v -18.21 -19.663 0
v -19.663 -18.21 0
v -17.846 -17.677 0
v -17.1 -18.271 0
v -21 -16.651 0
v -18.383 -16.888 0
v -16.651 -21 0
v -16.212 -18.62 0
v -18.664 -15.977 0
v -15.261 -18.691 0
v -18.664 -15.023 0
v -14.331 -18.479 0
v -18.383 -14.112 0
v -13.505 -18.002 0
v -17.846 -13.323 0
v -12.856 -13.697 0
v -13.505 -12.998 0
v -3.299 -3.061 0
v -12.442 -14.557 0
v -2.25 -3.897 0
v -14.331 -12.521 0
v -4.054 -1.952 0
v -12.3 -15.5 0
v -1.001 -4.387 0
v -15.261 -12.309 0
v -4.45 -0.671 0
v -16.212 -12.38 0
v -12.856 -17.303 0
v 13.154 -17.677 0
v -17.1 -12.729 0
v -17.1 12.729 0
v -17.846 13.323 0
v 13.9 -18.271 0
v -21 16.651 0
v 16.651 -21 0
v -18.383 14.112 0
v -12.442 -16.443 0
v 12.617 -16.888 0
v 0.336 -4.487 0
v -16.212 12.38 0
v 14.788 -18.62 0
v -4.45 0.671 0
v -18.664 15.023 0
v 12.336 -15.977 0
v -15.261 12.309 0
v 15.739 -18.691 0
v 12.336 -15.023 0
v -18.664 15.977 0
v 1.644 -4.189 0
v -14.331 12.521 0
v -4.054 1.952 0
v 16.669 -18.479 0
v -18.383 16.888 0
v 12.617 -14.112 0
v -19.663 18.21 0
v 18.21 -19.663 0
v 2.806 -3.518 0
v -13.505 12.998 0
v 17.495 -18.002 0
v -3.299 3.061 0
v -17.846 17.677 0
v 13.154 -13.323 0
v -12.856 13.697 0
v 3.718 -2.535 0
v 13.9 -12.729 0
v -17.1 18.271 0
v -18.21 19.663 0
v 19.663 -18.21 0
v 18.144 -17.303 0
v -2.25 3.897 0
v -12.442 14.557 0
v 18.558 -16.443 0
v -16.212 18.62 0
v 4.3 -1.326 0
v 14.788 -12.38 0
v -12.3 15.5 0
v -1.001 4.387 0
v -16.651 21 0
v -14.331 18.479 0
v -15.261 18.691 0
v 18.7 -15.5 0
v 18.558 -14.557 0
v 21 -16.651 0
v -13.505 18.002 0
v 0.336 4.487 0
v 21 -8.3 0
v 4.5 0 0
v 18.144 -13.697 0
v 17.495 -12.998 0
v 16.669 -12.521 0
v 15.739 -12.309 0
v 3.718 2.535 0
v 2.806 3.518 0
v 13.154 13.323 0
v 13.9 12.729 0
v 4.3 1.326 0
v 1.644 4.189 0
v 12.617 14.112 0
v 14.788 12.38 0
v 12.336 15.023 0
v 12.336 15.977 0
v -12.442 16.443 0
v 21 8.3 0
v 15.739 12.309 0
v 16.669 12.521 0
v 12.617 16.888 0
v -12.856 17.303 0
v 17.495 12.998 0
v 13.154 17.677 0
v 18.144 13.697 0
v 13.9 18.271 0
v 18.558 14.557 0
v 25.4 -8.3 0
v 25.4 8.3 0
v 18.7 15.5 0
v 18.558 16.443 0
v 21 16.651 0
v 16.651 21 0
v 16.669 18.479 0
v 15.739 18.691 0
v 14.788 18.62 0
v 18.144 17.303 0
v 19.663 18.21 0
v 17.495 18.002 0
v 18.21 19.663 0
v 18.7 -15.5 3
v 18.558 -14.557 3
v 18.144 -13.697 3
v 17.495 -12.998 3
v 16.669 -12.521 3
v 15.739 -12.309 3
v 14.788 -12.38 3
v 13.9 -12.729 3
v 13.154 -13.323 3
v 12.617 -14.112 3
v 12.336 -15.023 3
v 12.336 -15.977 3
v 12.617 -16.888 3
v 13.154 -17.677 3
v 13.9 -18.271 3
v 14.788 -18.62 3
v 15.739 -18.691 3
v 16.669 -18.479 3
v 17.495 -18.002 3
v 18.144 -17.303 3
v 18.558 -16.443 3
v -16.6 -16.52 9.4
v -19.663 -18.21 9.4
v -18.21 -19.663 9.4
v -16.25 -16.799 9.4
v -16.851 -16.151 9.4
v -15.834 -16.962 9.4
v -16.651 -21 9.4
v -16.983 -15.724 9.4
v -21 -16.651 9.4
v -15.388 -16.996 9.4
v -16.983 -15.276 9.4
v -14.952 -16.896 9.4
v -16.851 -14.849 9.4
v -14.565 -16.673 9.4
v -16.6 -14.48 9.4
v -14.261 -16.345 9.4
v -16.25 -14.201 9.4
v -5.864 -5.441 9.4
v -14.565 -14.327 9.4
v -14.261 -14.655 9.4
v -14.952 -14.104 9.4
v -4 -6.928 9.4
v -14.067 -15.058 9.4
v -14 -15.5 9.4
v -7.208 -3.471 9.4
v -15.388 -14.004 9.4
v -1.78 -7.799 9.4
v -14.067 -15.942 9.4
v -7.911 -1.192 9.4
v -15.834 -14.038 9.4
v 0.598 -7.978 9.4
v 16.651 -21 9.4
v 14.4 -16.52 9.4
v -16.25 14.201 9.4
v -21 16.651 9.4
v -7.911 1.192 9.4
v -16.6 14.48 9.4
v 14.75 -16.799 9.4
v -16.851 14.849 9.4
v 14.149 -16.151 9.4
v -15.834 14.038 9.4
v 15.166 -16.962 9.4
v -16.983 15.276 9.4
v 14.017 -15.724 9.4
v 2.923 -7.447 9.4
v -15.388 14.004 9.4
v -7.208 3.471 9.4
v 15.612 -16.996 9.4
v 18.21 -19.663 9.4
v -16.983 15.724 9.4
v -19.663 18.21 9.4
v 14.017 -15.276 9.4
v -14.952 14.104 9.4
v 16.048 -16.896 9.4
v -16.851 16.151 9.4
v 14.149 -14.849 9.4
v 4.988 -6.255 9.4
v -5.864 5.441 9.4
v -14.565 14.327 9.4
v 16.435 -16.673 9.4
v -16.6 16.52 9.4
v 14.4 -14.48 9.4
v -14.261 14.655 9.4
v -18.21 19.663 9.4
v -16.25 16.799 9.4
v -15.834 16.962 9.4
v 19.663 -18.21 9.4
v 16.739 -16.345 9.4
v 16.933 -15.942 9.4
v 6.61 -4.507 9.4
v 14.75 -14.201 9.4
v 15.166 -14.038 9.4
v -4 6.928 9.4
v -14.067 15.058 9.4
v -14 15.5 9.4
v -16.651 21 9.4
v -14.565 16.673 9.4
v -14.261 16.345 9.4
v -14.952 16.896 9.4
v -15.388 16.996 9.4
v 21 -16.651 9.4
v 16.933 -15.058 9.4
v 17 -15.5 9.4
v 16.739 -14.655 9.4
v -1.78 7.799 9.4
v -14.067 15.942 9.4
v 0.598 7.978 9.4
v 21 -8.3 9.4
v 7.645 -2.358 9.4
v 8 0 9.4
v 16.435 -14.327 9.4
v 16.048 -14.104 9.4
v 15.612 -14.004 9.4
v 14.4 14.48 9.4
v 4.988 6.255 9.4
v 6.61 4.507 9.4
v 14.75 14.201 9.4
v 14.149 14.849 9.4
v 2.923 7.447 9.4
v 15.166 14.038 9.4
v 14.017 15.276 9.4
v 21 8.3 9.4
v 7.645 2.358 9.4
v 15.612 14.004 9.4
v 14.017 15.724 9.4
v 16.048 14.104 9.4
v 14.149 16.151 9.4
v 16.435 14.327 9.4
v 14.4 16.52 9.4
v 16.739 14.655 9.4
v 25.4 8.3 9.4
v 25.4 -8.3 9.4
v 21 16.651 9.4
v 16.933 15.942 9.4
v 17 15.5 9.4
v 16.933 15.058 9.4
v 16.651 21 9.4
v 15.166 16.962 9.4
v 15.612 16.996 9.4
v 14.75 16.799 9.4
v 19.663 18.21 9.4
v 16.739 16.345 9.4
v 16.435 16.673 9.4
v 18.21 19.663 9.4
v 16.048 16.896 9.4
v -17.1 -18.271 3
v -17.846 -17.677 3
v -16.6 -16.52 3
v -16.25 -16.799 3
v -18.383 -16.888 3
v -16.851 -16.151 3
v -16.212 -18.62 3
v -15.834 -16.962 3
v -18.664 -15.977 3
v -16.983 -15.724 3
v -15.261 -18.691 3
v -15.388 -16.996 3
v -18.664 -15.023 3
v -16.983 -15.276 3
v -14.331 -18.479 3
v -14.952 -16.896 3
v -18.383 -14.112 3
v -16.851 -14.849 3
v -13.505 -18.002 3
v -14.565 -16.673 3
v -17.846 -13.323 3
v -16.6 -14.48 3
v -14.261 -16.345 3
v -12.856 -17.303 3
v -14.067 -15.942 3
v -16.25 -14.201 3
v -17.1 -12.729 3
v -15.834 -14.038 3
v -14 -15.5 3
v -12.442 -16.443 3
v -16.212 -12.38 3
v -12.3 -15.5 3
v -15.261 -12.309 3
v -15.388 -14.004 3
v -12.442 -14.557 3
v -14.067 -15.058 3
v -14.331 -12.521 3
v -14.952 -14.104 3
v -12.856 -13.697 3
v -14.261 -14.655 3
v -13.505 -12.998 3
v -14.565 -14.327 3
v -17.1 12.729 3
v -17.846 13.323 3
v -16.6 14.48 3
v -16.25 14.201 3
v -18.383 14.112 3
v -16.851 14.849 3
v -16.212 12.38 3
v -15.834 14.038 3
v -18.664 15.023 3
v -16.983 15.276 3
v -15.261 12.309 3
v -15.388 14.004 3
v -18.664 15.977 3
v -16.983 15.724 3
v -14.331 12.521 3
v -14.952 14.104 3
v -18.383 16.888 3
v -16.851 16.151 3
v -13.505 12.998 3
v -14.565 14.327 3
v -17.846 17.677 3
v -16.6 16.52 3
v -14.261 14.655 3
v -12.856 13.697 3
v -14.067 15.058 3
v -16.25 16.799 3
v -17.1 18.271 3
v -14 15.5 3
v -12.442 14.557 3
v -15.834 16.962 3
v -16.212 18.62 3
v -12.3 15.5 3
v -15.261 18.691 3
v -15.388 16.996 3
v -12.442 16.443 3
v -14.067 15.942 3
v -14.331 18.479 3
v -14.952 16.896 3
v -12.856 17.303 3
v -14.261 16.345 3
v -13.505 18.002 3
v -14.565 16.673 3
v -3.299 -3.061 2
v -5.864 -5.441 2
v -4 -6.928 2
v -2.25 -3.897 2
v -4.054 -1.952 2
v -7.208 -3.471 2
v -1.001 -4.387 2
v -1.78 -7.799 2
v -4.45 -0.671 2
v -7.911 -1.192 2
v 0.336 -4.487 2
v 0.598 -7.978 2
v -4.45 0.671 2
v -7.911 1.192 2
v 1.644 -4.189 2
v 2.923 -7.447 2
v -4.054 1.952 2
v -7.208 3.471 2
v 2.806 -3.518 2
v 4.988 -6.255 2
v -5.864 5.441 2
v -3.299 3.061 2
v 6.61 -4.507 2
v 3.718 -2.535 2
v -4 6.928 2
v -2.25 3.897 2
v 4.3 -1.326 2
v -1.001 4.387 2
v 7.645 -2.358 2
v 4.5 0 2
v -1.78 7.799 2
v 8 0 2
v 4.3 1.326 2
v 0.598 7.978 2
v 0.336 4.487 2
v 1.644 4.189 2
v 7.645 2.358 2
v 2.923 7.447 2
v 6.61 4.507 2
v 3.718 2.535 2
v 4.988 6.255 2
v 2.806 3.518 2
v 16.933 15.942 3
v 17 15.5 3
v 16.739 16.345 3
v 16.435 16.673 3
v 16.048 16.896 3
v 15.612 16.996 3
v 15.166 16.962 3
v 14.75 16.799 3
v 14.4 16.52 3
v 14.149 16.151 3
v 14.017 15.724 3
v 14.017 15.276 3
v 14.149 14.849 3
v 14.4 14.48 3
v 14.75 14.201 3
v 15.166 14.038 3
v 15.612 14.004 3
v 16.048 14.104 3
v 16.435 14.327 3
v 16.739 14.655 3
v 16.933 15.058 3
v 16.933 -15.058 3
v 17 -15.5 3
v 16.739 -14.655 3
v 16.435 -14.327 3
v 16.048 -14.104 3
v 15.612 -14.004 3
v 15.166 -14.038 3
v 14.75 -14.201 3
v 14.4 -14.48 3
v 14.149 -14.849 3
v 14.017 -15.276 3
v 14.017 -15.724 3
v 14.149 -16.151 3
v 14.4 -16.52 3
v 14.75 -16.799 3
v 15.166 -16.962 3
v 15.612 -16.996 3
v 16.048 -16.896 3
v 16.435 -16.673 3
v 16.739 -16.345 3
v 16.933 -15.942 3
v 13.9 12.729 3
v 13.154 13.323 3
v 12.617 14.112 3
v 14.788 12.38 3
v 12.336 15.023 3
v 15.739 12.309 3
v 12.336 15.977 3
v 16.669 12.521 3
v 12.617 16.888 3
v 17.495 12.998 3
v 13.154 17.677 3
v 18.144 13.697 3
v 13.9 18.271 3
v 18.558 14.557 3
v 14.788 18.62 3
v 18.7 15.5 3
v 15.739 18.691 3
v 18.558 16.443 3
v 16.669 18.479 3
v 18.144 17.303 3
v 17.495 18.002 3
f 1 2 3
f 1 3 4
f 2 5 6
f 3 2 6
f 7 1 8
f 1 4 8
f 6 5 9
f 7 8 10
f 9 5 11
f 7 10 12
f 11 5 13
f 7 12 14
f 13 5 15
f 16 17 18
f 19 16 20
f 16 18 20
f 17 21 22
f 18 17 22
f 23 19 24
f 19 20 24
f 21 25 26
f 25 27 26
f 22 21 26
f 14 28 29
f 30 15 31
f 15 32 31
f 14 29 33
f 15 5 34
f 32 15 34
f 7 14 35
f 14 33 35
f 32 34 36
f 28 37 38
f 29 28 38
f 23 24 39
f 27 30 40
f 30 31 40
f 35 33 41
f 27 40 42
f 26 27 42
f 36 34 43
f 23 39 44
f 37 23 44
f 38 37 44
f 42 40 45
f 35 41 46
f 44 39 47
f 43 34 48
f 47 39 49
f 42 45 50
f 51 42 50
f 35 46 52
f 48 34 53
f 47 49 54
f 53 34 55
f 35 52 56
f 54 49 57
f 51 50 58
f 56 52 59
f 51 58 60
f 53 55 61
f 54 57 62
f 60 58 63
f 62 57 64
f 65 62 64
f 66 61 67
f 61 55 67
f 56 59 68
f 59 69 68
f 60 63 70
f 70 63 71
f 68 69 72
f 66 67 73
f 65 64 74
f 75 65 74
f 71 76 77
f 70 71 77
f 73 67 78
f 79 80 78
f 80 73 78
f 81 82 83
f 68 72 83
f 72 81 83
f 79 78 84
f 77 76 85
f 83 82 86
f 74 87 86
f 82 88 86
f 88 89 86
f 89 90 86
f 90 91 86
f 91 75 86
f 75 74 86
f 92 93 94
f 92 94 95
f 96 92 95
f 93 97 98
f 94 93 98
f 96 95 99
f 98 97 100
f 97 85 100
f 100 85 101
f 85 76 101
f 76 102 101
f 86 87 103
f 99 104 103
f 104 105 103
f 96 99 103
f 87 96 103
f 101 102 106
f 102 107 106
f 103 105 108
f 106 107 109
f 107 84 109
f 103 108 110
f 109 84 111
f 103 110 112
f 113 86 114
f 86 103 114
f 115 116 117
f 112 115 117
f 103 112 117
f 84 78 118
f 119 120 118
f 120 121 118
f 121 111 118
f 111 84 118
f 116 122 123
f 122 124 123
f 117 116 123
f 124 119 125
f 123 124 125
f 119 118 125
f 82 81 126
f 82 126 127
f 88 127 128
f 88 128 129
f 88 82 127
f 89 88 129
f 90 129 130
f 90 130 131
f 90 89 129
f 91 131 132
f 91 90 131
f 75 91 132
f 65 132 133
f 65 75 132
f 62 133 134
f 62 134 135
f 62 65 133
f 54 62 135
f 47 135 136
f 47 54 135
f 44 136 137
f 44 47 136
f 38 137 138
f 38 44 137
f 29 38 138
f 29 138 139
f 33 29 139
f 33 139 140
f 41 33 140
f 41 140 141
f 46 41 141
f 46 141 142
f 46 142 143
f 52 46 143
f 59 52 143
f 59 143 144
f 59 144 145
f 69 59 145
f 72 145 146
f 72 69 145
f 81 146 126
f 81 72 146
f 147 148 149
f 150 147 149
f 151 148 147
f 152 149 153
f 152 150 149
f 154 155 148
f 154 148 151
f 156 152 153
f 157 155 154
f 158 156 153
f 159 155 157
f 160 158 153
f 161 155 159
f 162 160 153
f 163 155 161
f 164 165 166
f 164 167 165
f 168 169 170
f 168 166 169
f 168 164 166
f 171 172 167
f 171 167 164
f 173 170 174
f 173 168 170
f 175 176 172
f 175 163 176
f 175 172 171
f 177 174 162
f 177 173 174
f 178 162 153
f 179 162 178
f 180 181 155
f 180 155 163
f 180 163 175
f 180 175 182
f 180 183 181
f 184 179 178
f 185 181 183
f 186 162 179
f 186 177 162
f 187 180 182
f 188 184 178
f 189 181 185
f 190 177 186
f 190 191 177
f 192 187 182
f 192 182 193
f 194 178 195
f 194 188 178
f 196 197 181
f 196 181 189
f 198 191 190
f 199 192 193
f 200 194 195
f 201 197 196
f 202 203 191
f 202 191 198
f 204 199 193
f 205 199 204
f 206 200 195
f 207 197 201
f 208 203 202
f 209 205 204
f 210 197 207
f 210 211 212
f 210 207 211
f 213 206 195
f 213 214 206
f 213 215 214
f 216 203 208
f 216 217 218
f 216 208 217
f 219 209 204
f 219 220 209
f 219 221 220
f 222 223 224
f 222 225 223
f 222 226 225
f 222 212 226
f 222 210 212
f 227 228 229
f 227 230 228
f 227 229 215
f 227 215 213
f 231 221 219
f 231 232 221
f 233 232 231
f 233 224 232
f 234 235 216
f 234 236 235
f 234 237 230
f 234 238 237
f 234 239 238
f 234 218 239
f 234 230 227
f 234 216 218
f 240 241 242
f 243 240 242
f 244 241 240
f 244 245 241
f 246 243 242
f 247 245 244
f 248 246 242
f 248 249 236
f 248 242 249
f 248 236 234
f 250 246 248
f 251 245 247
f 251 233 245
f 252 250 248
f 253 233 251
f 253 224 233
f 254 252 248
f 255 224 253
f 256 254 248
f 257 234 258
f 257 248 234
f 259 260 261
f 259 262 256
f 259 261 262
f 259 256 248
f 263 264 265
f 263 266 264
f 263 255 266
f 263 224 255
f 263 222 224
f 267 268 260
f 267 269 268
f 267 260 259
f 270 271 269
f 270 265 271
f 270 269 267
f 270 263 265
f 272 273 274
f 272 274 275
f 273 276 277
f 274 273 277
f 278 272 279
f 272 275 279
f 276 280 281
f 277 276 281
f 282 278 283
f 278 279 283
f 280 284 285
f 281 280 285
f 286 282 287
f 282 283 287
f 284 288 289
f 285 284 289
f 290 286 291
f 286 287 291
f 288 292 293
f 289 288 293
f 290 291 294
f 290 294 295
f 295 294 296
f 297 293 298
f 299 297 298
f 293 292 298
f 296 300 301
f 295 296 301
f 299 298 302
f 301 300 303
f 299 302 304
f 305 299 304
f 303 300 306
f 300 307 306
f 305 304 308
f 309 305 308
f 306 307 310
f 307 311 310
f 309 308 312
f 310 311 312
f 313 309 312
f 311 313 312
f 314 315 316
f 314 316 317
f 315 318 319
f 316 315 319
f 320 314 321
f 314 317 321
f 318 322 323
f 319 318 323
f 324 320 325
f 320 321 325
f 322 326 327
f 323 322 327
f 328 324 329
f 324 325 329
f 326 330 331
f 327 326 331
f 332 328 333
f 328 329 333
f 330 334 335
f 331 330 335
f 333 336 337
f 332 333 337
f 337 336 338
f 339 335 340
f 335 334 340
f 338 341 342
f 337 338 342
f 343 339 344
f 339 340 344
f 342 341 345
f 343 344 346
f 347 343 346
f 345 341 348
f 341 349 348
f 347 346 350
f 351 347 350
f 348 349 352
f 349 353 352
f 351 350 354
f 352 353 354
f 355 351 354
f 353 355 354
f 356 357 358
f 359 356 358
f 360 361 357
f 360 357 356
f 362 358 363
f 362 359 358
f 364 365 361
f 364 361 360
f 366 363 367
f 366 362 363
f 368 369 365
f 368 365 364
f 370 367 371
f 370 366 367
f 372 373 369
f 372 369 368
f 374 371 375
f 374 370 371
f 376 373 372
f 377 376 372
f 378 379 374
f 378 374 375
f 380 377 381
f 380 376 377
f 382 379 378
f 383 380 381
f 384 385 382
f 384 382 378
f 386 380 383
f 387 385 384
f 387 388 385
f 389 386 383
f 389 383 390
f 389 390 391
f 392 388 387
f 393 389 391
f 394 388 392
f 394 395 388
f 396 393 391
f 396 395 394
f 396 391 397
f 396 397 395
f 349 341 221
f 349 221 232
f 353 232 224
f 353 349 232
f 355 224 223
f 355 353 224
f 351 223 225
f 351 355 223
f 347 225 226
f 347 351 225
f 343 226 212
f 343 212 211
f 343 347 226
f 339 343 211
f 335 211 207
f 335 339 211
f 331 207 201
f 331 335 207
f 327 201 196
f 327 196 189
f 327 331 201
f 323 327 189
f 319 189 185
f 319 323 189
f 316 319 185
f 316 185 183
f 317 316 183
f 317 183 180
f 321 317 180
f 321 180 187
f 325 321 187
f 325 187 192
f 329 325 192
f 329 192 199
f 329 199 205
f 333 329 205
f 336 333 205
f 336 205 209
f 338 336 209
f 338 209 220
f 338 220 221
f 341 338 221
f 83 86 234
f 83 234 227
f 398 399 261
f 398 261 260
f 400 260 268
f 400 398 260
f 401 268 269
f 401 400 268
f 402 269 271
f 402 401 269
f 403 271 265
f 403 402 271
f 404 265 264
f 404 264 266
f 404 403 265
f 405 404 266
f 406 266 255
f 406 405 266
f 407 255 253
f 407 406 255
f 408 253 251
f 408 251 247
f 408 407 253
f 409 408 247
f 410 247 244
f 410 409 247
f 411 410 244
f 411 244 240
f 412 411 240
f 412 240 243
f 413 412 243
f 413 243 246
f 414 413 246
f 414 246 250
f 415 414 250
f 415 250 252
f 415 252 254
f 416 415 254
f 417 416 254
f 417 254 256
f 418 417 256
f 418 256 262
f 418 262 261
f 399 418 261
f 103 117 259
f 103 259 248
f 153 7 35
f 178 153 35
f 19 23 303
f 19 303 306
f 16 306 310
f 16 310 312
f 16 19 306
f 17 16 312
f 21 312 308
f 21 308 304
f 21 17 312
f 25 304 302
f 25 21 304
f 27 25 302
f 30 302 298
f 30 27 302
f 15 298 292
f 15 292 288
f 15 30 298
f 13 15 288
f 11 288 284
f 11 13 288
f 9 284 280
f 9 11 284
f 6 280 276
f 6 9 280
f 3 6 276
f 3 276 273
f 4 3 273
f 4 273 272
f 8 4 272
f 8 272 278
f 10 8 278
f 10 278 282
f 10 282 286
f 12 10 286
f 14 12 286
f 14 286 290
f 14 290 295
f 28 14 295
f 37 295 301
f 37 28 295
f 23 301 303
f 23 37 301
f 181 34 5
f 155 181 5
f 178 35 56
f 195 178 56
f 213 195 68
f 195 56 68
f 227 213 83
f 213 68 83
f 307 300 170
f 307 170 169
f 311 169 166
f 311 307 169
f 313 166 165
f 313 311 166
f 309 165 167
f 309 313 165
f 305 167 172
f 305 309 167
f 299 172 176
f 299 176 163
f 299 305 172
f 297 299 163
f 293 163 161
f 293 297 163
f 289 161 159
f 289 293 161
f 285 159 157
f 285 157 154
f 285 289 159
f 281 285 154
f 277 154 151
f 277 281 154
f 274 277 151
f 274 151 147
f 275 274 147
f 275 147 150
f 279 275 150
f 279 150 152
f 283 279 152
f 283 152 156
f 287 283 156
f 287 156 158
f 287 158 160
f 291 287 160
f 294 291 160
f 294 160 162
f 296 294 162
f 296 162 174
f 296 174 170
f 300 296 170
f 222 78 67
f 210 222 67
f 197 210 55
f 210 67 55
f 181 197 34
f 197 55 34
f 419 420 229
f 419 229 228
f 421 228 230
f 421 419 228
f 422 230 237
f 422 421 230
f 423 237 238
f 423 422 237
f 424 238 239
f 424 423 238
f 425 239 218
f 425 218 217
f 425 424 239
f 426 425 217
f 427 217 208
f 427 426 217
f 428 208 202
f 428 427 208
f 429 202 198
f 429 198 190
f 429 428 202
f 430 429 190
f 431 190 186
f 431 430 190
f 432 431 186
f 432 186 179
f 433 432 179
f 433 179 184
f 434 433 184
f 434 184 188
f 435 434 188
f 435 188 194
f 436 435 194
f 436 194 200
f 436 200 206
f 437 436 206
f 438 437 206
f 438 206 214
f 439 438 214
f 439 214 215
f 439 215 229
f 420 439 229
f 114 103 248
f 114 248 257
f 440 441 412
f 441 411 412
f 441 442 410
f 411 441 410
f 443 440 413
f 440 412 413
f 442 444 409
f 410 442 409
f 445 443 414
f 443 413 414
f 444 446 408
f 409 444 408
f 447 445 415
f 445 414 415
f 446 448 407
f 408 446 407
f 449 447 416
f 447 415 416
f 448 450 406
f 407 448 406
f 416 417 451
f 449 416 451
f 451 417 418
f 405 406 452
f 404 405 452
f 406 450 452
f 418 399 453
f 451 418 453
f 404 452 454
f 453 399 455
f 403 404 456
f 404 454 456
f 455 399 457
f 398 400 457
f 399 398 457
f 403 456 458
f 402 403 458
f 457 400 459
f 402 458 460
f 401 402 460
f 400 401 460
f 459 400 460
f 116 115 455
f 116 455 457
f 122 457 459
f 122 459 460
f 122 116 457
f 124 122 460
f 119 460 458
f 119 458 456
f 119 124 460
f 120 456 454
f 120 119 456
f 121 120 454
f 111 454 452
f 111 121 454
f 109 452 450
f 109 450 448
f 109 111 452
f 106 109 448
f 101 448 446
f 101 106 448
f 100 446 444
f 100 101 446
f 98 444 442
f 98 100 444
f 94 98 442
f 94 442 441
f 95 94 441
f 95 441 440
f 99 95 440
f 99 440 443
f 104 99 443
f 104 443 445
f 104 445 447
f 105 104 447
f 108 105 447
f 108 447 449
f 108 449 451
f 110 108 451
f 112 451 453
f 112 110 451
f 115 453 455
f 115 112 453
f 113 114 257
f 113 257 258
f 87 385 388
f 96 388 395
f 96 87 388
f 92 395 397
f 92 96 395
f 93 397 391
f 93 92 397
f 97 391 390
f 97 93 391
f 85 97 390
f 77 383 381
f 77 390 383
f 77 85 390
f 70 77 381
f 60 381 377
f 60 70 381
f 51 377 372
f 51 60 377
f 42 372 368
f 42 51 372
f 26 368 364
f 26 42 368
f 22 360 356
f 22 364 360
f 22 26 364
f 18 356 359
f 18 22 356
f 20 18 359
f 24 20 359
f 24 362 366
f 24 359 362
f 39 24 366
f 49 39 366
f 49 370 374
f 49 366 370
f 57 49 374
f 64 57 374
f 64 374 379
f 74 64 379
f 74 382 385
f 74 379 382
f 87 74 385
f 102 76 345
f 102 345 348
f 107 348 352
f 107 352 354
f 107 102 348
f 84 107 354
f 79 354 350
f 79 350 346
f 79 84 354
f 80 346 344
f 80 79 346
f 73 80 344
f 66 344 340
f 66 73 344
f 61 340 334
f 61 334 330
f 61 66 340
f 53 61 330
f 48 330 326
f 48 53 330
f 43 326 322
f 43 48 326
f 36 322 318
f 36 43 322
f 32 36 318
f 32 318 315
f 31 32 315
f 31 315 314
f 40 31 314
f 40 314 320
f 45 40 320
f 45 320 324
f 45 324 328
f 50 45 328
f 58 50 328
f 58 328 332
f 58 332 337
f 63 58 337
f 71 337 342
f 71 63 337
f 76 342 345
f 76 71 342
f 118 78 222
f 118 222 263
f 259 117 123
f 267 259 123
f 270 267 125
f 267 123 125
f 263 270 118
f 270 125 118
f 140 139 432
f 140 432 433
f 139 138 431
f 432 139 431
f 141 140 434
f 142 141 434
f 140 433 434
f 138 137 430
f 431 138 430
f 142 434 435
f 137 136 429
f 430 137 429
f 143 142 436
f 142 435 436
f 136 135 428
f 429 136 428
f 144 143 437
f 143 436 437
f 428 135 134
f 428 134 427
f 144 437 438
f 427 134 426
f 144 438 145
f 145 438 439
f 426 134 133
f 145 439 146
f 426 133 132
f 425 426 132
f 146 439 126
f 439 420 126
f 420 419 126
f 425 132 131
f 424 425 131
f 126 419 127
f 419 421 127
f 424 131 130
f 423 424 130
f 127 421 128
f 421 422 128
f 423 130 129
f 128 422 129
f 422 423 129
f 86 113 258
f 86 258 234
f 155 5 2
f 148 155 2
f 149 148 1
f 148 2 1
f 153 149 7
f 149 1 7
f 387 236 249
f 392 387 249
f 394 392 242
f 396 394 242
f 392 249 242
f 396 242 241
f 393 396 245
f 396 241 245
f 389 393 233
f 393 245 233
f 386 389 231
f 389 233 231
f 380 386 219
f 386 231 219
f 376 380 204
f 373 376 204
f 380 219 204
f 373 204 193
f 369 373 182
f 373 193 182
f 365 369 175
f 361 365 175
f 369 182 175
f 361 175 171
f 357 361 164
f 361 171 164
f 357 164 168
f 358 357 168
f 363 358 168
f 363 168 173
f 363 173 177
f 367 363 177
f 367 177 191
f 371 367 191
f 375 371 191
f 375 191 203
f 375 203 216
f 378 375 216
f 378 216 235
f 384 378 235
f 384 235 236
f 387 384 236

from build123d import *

# Parameters (mm, degrees)
SKETCH_R        = 4.5
SKETCH_R_2      = 1.5
PAD_DEPTH       = 9.4
SKETCH002_R     = 3.2
POCKET_DEPTH    = 3
SKETCH003_R     = 8
POCKET001_DEPTH = 8


with BuildPart() as part:
    # Sketch → Pad (new body)
    with BuildSketch(Plane.XY):
        with BuildLine():
            ThreePointArc((-16.650526, 21), (-18.950462, 18.950462), (-21, 16.650526))
            Line((-21, 16.650526), (-21, -16.650526))
            ThreePointArc((-21, -16.650526), (-18.950462, -18.950462), (-16.650526, -21))
            Line((-16.650526, -21), (16.650526, -21))
            ThreePointArc((16.650526, -21), (18.950462, -18.950462), (21, -16.650526))
            Line((21, -8.3), (21, -16.650526))
            Line((25.4, -8.3), (21, -8.3))
            Line((25.4, 8.3), (25.4, -8.3))
            Line((21, 8.3), (25.4, 8.3))
            Line((21, 16.650526), (21, 8.3))
            ThreePointArc((21, 16.650526), (18.950462, 18.950462), (16.650526, 21))
            Line((-16.650526, 21), (16.650526, 21))
        make_face()
        Circle(SKETCH_R, mode=Mode.SUBTRACT)
        with Locations((-15.5, 15.5)):
            Circle(SKETCH_R_2, mode=Mode.SUBTRACT)
        with Locations((15.5, 15.5)):
            Circle(SKETCH_R_2, mode=Mode.SUBTRACT)
        with Locations((15.5, -15.5)):
            Circle(SKETCH_R_2, mode=Mode.SUBTRACT)
        with Locations((-15.5, -15.5)):
            Circle(SKETCH_R_2, mode=Mode.SUBTRACT)
    extrude(amount=PAD_DEPTH)

    # Sketch002 → Pocket (cut)
    with BuildSketch(Plane.XY):
        with Locations((-15.5, 15.5)):
            Circle(SKETCH002_R)
        with Locations((15.5, 15.5)):
            Circle(SKETCH002_R)
        with Locations((15.5, -15.5)):
            Circle(SKETCH002_R)
        with Locations((-15.5, -15.5)):
            Circle(SKETCH002_R)
    extrude(amount=POCKET_DEPTH, mode=Mode.SUBTRACT)

    # Sketch003 → Pocket001 (cut)
    with BuildSketch(Plane.XY.offset(10)):
        Circle(SKETCH003_R)
    extrude(amount=-POCKET001_DEPTH, mode=Mode.SUBTRACT)


solid = part.part
